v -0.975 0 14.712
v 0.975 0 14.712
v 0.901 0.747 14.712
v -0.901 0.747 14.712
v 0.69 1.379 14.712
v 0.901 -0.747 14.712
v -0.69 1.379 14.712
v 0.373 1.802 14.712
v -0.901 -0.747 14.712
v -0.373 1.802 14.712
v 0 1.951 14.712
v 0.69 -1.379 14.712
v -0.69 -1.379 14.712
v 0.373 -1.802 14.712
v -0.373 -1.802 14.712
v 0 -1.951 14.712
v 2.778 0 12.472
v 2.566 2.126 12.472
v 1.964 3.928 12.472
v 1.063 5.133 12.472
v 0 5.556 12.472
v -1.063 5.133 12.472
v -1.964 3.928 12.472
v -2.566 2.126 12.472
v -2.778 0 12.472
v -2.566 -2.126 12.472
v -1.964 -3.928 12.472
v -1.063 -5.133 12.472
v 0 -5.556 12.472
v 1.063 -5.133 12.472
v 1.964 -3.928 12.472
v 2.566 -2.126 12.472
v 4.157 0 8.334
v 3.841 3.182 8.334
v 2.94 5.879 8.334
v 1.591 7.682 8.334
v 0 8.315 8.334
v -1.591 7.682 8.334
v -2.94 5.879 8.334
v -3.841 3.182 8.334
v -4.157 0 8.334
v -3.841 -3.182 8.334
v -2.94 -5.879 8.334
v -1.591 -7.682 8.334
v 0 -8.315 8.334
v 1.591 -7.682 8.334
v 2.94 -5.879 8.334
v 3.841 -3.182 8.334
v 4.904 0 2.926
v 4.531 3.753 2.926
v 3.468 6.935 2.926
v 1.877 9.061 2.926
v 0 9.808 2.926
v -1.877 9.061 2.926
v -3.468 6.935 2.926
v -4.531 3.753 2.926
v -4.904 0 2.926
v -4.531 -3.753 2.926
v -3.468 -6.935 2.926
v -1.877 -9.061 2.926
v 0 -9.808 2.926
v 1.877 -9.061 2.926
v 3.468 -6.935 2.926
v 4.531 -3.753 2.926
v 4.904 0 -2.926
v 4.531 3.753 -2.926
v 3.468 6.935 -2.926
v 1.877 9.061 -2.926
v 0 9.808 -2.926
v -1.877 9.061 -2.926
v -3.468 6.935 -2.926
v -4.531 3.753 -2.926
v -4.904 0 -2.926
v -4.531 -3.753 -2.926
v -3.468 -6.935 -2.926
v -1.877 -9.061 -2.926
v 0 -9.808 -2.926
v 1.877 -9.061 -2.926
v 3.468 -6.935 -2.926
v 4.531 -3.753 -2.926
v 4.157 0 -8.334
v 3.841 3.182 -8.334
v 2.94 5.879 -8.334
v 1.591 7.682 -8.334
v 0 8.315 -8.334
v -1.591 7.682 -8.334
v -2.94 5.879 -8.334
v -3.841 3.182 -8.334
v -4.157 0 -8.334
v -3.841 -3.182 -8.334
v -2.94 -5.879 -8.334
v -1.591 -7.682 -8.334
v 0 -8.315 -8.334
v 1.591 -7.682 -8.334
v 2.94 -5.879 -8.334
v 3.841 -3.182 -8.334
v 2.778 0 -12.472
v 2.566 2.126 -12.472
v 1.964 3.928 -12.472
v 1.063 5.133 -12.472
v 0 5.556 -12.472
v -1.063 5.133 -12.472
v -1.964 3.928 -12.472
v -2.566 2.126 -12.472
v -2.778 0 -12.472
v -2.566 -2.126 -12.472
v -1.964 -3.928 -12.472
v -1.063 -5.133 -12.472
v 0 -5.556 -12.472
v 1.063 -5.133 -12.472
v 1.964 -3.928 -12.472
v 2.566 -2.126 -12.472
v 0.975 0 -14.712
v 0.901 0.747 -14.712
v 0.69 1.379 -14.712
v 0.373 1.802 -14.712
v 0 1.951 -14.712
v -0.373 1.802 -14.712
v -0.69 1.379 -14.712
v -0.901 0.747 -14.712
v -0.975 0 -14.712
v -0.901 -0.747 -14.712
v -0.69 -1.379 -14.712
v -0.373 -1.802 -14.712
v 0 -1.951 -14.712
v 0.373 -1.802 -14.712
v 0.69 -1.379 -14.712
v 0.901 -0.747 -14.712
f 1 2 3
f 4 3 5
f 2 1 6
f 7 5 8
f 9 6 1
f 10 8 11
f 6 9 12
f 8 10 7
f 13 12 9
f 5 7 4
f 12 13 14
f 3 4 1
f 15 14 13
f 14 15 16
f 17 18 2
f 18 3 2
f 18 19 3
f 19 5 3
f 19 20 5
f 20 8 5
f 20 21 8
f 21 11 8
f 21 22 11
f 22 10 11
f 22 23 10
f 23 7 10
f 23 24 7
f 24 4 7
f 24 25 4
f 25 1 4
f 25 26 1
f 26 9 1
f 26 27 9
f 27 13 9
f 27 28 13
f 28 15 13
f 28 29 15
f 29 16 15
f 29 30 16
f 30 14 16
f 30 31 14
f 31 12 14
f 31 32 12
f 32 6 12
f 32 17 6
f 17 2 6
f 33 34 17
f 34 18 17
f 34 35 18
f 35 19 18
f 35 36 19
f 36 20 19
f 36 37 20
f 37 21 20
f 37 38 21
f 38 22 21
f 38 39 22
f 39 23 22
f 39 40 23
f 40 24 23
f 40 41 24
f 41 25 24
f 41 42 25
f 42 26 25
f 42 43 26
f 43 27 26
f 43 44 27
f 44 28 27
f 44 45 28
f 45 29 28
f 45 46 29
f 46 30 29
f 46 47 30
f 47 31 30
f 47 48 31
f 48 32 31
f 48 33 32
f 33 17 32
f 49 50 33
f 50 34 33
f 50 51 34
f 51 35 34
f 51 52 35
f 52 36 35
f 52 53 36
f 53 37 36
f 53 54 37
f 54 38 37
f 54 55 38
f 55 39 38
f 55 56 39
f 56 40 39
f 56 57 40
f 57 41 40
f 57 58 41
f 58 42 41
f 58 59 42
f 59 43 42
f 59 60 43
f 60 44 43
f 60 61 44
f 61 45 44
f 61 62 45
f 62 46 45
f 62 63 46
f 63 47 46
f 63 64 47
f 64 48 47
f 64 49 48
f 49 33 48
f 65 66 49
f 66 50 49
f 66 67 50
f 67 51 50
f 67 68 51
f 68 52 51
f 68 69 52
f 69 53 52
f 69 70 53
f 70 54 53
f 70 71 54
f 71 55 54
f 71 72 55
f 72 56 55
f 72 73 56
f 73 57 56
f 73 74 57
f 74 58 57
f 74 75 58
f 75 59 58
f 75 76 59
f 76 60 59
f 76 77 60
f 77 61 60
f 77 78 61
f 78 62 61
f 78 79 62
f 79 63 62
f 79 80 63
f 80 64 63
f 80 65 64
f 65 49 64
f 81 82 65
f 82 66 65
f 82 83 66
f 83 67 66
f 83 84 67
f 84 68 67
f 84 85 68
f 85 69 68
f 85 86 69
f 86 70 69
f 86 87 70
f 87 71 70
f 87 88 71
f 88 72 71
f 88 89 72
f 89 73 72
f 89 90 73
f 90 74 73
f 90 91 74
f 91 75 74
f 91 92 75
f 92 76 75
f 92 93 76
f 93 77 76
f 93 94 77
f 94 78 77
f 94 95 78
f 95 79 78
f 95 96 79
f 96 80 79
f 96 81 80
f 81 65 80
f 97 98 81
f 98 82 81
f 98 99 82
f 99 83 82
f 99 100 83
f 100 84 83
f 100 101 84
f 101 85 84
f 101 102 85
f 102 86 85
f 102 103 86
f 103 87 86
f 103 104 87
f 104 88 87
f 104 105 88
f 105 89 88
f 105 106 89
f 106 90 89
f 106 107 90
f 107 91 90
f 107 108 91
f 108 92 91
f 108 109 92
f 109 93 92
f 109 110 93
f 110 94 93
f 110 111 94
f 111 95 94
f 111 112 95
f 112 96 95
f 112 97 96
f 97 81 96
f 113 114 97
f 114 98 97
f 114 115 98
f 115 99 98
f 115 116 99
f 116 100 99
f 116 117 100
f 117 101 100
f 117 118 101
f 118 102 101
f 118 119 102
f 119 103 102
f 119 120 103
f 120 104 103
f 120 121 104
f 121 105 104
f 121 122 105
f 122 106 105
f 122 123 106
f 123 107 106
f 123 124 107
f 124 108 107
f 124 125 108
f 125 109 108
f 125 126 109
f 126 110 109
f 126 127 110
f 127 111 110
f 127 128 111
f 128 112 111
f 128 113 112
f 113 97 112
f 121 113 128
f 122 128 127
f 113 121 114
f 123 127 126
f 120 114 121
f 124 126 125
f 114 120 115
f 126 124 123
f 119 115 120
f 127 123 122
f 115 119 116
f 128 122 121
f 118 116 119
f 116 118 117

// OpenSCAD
color("CornflowerBlue")
    scale([1.0,2.0,3.0]) sphere(r=5.0);
